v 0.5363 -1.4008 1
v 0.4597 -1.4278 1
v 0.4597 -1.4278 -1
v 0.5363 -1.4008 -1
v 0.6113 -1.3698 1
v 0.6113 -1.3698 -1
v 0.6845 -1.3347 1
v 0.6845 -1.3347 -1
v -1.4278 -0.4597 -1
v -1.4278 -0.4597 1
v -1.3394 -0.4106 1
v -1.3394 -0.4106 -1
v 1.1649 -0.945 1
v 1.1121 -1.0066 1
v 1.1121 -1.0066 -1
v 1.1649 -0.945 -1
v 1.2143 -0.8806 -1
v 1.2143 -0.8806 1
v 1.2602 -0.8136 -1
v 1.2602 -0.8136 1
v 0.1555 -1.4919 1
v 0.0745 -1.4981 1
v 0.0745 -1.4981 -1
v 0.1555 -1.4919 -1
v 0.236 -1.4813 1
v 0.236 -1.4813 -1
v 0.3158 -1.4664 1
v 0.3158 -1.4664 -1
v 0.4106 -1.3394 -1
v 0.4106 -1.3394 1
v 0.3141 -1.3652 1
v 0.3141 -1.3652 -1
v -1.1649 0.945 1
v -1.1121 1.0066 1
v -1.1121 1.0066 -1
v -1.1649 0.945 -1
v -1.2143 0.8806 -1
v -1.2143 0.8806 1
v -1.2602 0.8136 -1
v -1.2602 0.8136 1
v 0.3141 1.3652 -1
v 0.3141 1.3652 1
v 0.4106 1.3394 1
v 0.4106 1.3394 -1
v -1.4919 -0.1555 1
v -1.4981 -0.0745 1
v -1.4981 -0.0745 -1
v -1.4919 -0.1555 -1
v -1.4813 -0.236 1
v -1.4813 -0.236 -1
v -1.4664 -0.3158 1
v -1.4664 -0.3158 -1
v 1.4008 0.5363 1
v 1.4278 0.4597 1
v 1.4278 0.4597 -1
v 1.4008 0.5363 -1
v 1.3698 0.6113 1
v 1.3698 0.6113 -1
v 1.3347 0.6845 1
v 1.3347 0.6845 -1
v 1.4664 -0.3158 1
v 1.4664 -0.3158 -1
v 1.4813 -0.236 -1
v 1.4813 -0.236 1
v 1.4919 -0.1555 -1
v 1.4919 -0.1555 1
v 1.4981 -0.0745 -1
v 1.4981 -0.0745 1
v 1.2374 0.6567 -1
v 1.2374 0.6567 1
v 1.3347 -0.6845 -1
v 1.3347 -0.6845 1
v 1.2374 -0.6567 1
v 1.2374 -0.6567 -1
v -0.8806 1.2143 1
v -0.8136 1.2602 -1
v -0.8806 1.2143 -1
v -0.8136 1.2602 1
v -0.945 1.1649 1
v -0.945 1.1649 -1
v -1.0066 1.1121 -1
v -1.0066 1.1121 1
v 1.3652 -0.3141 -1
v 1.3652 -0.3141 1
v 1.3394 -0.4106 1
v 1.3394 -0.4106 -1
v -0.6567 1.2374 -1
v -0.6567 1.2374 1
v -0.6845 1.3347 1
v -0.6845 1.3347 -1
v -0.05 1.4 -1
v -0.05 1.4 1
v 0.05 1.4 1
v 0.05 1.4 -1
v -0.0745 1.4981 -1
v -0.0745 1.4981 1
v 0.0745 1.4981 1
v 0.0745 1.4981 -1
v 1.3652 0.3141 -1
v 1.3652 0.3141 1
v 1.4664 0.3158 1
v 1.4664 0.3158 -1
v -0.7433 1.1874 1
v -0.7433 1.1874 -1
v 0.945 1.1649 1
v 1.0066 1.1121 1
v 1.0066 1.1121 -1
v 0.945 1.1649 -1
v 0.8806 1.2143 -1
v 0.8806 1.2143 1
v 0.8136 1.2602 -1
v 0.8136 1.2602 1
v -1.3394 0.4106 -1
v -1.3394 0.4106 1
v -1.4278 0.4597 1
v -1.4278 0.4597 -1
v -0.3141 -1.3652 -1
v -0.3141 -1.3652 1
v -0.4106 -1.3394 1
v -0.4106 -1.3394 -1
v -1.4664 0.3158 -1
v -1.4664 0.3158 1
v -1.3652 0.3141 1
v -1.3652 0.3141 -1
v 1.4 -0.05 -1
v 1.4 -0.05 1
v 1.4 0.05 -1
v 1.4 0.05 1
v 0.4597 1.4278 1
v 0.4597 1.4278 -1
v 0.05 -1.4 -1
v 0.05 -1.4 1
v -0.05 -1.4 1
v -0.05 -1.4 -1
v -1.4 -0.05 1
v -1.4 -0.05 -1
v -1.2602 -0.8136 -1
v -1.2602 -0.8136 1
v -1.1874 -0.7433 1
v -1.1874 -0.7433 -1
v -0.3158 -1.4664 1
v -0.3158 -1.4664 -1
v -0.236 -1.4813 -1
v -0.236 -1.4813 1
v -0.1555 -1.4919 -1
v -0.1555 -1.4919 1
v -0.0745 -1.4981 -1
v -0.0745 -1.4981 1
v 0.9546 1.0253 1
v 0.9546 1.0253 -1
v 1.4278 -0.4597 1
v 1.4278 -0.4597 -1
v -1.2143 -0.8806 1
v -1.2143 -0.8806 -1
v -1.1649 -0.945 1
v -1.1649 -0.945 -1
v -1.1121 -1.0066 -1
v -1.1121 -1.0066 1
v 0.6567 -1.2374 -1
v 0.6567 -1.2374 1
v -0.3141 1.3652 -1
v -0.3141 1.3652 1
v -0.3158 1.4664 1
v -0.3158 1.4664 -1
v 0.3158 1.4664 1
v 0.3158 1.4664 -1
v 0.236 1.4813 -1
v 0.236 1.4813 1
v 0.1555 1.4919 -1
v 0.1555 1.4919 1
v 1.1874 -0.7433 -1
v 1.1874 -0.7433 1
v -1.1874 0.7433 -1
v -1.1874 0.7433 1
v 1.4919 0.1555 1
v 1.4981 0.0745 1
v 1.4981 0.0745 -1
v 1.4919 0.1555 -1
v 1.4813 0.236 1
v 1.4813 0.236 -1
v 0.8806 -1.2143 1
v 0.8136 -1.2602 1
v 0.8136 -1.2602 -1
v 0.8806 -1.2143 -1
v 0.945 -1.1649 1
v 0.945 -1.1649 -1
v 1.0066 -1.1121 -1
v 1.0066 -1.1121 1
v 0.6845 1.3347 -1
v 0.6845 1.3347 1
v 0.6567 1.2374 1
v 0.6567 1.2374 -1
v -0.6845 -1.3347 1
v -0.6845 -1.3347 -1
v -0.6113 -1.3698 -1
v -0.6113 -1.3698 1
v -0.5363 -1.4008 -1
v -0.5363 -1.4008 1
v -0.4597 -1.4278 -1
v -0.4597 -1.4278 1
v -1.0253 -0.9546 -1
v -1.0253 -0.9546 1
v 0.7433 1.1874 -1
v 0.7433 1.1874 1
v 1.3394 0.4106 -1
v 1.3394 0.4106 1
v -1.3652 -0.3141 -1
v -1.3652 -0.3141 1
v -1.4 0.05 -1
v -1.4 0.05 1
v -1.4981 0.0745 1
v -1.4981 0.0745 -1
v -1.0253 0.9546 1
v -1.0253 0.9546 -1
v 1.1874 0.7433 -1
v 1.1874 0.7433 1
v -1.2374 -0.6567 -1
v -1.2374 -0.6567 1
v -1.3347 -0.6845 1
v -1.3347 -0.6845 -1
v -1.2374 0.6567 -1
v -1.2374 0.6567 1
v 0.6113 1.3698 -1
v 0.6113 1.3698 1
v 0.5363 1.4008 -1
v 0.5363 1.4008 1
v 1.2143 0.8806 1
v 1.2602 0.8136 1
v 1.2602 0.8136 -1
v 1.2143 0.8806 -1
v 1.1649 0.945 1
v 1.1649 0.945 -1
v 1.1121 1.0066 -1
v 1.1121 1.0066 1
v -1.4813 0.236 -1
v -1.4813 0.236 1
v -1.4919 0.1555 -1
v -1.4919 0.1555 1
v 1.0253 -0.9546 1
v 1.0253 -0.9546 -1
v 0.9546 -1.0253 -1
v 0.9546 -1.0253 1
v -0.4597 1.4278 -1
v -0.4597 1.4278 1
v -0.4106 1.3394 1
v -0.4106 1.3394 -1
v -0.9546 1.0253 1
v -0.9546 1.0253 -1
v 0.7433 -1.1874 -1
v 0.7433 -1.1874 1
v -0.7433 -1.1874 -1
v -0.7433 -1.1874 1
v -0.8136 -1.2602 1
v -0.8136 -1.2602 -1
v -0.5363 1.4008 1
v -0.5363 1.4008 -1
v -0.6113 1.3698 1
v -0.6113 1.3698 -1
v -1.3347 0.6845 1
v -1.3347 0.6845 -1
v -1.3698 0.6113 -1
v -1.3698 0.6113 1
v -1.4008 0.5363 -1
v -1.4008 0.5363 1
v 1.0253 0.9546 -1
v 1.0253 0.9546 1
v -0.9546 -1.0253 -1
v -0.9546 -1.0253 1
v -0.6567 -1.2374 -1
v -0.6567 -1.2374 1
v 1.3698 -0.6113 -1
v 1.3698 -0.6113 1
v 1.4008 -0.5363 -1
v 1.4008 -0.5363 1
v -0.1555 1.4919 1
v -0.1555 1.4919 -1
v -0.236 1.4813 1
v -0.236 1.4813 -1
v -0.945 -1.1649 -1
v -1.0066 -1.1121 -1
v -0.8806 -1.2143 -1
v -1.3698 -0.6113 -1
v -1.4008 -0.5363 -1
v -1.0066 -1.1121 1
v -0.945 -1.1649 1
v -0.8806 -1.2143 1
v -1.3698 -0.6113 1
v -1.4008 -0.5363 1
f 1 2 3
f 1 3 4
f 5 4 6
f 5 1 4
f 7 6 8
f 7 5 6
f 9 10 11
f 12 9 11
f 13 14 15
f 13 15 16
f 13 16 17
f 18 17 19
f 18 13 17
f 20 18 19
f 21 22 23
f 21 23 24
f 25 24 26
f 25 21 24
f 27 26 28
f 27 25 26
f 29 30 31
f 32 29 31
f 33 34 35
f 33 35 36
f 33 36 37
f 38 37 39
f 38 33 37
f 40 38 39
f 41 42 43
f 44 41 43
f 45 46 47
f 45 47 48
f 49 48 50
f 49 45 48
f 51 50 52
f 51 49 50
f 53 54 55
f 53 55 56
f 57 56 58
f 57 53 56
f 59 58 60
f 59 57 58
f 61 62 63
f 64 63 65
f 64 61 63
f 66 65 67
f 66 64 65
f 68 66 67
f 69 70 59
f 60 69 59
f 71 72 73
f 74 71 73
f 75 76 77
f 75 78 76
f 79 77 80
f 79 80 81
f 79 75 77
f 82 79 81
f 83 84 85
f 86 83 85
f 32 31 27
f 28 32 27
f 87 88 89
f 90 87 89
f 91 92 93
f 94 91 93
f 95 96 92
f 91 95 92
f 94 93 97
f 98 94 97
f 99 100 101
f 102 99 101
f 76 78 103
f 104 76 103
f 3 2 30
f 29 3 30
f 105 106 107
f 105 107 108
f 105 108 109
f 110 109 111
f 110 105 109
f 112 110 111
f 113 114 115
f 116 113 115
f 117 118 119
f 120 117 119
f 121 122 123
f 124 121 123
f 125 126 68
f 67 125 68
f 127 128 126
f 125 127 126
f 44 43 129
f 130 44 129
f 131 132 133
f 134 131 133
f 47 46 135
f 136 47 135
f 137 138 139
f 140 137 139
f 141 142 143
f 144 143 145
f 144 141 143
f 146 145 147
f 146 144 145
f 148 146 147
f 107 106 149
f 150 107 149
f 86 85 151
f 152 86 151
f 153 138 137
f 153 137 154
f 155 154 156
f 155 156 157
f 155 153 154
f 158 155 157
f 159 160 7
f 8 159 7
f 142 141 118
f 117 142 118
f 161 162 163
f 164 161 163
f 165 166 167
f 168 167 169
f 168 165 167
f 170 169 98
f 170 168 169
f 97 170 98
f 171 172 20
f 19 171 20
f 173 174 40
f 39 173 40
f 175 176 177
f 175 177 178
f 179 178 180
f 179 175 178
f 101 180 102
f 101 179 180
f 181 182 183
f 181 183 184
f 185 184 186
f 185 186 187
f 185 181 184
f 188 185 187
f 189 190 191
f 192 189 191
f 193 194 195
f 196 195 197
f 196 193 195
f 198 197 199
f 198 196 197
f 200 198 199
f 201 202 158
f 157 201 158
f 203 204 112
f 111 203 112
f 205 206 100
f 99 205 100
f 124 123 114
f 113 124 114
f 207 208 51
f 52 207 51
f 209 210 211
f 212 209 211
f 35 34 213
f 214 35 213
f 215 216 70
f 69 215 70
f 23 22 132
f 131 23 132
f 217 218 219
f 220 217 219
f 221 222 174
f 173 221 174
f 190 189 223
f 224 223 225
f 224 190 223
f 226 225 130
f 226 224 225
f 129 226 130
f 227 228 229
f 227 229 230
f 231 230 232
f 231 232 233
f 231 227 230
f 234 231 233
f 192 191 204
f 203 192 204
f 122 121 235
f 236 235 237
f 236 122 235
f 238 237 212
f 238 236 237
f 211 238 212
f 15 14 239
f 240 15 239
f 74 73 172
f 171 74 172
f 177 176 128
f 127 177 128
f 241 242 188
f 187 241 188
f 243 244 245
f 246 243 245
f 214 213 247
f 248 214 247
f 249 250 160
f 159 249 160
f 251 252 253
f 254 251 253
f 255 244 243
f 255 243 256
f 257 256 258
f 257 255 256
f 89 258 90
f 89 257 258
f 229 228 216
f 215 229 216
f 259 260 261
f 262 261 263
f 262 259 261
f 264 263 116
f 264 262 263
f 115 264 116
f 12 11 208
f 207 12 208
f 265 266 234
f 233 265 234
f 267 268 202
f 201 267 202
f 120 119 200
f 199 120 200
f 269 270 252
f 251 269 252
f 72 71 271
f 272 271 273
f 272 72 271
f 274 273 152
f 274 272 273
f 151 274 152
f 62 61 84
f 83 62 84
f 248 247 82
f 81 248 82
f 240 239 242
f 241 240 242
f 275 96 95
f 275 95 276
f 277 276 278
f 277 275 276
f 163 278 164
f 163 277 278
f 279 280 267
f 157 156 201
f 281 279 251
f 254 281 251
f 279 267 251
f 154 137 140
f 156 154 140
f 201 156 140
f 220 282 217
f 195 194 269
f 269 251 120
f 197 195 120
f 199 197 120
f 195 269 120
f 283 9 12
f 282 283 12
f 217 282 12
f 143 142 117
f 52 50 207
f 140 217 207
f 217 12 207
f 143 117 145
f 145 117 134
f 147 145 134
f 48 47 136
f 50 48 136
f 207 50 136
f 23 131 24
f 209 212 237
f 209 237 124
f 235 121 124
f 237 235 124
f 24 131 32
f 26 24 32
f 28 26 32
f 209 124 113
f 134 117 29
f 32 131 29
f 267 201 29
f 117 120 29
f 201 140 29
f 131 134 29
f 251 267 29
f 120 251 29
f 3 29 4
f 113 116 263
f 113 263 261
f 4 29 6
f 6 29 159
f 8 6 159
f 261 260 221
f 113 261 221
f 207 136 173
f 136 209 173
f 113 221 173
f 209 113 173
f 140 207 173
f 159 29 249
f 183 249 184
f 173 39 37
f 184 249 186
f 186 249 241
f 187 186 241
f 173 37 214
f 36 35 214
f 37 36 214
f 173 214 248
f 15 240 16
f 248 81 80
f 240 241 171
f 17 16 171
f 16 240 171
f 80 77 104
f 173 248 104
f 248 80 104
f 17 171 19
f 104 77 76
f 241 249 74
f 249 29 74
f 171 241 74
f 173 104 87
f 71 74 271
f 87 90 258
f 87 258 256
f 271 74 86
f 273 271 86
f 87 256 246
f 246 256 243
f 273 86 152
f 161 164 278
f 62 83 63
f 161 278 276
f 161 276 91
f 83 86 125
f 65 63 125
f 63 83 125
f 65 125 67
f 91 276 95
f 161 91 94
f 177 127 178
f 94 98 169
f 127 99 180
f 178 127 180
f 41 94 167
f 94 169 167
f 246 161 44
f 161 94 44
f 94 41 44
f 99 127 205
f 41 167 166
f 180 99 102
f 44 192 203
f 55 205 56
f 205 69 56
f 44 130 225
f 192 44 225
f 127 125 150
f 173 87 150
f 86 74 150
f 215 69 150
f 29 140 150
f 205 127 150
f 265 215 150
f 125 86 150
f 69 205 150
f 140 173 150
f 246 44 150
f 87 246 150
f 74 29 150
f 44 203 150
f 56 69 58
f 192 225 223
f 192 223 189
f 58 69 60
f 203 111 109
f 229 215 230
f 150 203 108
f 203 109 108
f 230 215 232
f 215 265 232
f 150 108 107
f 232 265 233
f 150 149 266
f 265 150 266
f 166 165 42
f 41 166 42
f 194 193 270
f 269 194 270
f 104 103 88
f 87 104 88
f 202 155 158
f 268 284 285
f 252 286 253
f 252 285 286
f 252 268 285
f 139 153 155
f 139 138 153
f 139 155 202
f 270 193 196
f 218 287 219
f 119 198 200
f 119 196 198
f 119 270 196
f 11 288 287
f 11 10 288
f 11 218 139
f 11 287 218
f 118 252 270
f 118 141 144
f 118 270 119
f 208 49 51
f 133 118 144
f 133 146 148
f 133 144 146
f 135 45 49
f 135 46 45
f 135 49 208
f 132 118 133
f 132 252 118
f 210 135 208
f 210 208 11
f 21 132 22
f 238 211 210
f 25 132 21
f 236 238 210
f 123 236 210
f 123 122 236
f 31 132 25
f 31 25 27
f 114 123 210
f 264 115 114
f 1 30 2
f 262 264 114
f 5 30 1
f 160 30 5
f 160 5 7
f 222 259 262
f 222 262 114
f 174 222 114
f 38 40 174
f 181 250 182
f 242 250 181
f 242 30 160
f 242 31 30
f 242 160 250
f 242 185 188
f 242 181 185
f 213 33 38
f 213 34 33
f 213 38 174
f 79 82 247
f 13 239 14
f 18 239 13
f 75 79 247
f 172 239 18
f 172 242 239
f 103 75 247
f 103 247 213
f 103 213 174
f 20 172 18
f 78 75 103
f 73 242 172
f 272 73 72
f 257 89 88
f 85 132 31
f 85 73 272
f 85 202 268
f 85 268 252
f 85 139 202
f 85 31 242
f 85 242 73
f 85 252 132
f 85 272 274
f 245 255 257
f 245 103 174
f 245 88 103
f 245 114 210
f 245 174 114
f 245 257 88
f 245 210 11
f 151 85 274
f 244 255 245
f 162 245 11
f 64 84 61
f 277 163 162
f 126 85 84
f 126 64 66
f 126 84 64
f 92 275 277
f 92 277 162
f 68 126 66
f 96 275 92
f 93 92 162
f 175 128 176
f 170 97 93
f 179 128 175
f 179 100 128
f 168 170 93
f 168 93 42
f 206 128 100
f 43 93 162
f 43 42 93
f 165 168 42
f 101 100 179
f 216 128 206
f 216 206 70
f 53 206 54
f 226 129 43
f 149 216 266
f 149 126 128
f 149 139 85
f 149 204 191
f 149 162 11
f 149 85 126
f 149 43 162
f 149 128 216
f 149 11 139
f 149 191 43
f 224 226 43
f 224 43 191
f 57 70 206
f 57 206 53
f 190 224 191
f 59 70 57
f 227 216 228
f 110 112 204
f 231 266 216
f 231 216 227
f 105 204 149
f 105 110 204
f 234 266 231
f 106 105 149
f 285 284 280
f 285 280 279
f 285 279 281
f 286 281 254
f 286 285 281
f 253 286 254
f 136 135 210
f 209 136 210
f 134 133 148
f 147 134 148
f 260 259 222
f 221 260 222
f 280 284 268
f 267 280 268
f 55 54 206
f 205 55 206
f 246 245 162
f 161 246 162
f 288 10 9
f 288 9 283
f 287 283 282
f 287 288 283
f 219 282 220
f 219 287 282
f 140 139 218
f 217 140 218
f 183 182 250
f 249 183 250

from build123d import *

# Parameters (mm, degrees)
SKETCH_1_R               = 1.5
EXTRUDE_1_DEPTH          = 1
CUT_EXTRUDE_1_DEPTH      = 4
PATTERN_CIRCULAR_1_COUNT = 24


with BuildPart() as part:
    # 草图1 → 凸台-拉伸1 (new, symmetric)
    with BuildSketch(Plane.XY):
        Circle(SKETCH_1_R)
    extrude(amount=EXTRUDE_1_DEPTH, both=True)

    # 草图2 → 切除-拉伸1 (cut)
    with BuildSketch(Plane.XY.offset(1)):
        Polygon((-0.075, 1.5), (-0.05, 1.4), (0.05, 1.4), (0.075, 1.5), align=None)
    cut_extrude_1 = extrude(amount=-CUT_EXTRUDE_1_DEPTH, mode=Mode.SUBTRACT)

    # 阵列(圆周)1: 切除-拉伸1 ×24 about axis
    pattern_circular_1_axis = Axis((0, 0, 0), (0, 0, 1))
    for i in range(1, PATTERN_CIRCULAR_1_COUNT):
        add(cut_extrude_1.rotate(pattern_circular_1_axis, i * 360 / PATTERN_CIRCULAR_1_COUNT), mode=Mode.SUBTRACT)


solid = part.part
